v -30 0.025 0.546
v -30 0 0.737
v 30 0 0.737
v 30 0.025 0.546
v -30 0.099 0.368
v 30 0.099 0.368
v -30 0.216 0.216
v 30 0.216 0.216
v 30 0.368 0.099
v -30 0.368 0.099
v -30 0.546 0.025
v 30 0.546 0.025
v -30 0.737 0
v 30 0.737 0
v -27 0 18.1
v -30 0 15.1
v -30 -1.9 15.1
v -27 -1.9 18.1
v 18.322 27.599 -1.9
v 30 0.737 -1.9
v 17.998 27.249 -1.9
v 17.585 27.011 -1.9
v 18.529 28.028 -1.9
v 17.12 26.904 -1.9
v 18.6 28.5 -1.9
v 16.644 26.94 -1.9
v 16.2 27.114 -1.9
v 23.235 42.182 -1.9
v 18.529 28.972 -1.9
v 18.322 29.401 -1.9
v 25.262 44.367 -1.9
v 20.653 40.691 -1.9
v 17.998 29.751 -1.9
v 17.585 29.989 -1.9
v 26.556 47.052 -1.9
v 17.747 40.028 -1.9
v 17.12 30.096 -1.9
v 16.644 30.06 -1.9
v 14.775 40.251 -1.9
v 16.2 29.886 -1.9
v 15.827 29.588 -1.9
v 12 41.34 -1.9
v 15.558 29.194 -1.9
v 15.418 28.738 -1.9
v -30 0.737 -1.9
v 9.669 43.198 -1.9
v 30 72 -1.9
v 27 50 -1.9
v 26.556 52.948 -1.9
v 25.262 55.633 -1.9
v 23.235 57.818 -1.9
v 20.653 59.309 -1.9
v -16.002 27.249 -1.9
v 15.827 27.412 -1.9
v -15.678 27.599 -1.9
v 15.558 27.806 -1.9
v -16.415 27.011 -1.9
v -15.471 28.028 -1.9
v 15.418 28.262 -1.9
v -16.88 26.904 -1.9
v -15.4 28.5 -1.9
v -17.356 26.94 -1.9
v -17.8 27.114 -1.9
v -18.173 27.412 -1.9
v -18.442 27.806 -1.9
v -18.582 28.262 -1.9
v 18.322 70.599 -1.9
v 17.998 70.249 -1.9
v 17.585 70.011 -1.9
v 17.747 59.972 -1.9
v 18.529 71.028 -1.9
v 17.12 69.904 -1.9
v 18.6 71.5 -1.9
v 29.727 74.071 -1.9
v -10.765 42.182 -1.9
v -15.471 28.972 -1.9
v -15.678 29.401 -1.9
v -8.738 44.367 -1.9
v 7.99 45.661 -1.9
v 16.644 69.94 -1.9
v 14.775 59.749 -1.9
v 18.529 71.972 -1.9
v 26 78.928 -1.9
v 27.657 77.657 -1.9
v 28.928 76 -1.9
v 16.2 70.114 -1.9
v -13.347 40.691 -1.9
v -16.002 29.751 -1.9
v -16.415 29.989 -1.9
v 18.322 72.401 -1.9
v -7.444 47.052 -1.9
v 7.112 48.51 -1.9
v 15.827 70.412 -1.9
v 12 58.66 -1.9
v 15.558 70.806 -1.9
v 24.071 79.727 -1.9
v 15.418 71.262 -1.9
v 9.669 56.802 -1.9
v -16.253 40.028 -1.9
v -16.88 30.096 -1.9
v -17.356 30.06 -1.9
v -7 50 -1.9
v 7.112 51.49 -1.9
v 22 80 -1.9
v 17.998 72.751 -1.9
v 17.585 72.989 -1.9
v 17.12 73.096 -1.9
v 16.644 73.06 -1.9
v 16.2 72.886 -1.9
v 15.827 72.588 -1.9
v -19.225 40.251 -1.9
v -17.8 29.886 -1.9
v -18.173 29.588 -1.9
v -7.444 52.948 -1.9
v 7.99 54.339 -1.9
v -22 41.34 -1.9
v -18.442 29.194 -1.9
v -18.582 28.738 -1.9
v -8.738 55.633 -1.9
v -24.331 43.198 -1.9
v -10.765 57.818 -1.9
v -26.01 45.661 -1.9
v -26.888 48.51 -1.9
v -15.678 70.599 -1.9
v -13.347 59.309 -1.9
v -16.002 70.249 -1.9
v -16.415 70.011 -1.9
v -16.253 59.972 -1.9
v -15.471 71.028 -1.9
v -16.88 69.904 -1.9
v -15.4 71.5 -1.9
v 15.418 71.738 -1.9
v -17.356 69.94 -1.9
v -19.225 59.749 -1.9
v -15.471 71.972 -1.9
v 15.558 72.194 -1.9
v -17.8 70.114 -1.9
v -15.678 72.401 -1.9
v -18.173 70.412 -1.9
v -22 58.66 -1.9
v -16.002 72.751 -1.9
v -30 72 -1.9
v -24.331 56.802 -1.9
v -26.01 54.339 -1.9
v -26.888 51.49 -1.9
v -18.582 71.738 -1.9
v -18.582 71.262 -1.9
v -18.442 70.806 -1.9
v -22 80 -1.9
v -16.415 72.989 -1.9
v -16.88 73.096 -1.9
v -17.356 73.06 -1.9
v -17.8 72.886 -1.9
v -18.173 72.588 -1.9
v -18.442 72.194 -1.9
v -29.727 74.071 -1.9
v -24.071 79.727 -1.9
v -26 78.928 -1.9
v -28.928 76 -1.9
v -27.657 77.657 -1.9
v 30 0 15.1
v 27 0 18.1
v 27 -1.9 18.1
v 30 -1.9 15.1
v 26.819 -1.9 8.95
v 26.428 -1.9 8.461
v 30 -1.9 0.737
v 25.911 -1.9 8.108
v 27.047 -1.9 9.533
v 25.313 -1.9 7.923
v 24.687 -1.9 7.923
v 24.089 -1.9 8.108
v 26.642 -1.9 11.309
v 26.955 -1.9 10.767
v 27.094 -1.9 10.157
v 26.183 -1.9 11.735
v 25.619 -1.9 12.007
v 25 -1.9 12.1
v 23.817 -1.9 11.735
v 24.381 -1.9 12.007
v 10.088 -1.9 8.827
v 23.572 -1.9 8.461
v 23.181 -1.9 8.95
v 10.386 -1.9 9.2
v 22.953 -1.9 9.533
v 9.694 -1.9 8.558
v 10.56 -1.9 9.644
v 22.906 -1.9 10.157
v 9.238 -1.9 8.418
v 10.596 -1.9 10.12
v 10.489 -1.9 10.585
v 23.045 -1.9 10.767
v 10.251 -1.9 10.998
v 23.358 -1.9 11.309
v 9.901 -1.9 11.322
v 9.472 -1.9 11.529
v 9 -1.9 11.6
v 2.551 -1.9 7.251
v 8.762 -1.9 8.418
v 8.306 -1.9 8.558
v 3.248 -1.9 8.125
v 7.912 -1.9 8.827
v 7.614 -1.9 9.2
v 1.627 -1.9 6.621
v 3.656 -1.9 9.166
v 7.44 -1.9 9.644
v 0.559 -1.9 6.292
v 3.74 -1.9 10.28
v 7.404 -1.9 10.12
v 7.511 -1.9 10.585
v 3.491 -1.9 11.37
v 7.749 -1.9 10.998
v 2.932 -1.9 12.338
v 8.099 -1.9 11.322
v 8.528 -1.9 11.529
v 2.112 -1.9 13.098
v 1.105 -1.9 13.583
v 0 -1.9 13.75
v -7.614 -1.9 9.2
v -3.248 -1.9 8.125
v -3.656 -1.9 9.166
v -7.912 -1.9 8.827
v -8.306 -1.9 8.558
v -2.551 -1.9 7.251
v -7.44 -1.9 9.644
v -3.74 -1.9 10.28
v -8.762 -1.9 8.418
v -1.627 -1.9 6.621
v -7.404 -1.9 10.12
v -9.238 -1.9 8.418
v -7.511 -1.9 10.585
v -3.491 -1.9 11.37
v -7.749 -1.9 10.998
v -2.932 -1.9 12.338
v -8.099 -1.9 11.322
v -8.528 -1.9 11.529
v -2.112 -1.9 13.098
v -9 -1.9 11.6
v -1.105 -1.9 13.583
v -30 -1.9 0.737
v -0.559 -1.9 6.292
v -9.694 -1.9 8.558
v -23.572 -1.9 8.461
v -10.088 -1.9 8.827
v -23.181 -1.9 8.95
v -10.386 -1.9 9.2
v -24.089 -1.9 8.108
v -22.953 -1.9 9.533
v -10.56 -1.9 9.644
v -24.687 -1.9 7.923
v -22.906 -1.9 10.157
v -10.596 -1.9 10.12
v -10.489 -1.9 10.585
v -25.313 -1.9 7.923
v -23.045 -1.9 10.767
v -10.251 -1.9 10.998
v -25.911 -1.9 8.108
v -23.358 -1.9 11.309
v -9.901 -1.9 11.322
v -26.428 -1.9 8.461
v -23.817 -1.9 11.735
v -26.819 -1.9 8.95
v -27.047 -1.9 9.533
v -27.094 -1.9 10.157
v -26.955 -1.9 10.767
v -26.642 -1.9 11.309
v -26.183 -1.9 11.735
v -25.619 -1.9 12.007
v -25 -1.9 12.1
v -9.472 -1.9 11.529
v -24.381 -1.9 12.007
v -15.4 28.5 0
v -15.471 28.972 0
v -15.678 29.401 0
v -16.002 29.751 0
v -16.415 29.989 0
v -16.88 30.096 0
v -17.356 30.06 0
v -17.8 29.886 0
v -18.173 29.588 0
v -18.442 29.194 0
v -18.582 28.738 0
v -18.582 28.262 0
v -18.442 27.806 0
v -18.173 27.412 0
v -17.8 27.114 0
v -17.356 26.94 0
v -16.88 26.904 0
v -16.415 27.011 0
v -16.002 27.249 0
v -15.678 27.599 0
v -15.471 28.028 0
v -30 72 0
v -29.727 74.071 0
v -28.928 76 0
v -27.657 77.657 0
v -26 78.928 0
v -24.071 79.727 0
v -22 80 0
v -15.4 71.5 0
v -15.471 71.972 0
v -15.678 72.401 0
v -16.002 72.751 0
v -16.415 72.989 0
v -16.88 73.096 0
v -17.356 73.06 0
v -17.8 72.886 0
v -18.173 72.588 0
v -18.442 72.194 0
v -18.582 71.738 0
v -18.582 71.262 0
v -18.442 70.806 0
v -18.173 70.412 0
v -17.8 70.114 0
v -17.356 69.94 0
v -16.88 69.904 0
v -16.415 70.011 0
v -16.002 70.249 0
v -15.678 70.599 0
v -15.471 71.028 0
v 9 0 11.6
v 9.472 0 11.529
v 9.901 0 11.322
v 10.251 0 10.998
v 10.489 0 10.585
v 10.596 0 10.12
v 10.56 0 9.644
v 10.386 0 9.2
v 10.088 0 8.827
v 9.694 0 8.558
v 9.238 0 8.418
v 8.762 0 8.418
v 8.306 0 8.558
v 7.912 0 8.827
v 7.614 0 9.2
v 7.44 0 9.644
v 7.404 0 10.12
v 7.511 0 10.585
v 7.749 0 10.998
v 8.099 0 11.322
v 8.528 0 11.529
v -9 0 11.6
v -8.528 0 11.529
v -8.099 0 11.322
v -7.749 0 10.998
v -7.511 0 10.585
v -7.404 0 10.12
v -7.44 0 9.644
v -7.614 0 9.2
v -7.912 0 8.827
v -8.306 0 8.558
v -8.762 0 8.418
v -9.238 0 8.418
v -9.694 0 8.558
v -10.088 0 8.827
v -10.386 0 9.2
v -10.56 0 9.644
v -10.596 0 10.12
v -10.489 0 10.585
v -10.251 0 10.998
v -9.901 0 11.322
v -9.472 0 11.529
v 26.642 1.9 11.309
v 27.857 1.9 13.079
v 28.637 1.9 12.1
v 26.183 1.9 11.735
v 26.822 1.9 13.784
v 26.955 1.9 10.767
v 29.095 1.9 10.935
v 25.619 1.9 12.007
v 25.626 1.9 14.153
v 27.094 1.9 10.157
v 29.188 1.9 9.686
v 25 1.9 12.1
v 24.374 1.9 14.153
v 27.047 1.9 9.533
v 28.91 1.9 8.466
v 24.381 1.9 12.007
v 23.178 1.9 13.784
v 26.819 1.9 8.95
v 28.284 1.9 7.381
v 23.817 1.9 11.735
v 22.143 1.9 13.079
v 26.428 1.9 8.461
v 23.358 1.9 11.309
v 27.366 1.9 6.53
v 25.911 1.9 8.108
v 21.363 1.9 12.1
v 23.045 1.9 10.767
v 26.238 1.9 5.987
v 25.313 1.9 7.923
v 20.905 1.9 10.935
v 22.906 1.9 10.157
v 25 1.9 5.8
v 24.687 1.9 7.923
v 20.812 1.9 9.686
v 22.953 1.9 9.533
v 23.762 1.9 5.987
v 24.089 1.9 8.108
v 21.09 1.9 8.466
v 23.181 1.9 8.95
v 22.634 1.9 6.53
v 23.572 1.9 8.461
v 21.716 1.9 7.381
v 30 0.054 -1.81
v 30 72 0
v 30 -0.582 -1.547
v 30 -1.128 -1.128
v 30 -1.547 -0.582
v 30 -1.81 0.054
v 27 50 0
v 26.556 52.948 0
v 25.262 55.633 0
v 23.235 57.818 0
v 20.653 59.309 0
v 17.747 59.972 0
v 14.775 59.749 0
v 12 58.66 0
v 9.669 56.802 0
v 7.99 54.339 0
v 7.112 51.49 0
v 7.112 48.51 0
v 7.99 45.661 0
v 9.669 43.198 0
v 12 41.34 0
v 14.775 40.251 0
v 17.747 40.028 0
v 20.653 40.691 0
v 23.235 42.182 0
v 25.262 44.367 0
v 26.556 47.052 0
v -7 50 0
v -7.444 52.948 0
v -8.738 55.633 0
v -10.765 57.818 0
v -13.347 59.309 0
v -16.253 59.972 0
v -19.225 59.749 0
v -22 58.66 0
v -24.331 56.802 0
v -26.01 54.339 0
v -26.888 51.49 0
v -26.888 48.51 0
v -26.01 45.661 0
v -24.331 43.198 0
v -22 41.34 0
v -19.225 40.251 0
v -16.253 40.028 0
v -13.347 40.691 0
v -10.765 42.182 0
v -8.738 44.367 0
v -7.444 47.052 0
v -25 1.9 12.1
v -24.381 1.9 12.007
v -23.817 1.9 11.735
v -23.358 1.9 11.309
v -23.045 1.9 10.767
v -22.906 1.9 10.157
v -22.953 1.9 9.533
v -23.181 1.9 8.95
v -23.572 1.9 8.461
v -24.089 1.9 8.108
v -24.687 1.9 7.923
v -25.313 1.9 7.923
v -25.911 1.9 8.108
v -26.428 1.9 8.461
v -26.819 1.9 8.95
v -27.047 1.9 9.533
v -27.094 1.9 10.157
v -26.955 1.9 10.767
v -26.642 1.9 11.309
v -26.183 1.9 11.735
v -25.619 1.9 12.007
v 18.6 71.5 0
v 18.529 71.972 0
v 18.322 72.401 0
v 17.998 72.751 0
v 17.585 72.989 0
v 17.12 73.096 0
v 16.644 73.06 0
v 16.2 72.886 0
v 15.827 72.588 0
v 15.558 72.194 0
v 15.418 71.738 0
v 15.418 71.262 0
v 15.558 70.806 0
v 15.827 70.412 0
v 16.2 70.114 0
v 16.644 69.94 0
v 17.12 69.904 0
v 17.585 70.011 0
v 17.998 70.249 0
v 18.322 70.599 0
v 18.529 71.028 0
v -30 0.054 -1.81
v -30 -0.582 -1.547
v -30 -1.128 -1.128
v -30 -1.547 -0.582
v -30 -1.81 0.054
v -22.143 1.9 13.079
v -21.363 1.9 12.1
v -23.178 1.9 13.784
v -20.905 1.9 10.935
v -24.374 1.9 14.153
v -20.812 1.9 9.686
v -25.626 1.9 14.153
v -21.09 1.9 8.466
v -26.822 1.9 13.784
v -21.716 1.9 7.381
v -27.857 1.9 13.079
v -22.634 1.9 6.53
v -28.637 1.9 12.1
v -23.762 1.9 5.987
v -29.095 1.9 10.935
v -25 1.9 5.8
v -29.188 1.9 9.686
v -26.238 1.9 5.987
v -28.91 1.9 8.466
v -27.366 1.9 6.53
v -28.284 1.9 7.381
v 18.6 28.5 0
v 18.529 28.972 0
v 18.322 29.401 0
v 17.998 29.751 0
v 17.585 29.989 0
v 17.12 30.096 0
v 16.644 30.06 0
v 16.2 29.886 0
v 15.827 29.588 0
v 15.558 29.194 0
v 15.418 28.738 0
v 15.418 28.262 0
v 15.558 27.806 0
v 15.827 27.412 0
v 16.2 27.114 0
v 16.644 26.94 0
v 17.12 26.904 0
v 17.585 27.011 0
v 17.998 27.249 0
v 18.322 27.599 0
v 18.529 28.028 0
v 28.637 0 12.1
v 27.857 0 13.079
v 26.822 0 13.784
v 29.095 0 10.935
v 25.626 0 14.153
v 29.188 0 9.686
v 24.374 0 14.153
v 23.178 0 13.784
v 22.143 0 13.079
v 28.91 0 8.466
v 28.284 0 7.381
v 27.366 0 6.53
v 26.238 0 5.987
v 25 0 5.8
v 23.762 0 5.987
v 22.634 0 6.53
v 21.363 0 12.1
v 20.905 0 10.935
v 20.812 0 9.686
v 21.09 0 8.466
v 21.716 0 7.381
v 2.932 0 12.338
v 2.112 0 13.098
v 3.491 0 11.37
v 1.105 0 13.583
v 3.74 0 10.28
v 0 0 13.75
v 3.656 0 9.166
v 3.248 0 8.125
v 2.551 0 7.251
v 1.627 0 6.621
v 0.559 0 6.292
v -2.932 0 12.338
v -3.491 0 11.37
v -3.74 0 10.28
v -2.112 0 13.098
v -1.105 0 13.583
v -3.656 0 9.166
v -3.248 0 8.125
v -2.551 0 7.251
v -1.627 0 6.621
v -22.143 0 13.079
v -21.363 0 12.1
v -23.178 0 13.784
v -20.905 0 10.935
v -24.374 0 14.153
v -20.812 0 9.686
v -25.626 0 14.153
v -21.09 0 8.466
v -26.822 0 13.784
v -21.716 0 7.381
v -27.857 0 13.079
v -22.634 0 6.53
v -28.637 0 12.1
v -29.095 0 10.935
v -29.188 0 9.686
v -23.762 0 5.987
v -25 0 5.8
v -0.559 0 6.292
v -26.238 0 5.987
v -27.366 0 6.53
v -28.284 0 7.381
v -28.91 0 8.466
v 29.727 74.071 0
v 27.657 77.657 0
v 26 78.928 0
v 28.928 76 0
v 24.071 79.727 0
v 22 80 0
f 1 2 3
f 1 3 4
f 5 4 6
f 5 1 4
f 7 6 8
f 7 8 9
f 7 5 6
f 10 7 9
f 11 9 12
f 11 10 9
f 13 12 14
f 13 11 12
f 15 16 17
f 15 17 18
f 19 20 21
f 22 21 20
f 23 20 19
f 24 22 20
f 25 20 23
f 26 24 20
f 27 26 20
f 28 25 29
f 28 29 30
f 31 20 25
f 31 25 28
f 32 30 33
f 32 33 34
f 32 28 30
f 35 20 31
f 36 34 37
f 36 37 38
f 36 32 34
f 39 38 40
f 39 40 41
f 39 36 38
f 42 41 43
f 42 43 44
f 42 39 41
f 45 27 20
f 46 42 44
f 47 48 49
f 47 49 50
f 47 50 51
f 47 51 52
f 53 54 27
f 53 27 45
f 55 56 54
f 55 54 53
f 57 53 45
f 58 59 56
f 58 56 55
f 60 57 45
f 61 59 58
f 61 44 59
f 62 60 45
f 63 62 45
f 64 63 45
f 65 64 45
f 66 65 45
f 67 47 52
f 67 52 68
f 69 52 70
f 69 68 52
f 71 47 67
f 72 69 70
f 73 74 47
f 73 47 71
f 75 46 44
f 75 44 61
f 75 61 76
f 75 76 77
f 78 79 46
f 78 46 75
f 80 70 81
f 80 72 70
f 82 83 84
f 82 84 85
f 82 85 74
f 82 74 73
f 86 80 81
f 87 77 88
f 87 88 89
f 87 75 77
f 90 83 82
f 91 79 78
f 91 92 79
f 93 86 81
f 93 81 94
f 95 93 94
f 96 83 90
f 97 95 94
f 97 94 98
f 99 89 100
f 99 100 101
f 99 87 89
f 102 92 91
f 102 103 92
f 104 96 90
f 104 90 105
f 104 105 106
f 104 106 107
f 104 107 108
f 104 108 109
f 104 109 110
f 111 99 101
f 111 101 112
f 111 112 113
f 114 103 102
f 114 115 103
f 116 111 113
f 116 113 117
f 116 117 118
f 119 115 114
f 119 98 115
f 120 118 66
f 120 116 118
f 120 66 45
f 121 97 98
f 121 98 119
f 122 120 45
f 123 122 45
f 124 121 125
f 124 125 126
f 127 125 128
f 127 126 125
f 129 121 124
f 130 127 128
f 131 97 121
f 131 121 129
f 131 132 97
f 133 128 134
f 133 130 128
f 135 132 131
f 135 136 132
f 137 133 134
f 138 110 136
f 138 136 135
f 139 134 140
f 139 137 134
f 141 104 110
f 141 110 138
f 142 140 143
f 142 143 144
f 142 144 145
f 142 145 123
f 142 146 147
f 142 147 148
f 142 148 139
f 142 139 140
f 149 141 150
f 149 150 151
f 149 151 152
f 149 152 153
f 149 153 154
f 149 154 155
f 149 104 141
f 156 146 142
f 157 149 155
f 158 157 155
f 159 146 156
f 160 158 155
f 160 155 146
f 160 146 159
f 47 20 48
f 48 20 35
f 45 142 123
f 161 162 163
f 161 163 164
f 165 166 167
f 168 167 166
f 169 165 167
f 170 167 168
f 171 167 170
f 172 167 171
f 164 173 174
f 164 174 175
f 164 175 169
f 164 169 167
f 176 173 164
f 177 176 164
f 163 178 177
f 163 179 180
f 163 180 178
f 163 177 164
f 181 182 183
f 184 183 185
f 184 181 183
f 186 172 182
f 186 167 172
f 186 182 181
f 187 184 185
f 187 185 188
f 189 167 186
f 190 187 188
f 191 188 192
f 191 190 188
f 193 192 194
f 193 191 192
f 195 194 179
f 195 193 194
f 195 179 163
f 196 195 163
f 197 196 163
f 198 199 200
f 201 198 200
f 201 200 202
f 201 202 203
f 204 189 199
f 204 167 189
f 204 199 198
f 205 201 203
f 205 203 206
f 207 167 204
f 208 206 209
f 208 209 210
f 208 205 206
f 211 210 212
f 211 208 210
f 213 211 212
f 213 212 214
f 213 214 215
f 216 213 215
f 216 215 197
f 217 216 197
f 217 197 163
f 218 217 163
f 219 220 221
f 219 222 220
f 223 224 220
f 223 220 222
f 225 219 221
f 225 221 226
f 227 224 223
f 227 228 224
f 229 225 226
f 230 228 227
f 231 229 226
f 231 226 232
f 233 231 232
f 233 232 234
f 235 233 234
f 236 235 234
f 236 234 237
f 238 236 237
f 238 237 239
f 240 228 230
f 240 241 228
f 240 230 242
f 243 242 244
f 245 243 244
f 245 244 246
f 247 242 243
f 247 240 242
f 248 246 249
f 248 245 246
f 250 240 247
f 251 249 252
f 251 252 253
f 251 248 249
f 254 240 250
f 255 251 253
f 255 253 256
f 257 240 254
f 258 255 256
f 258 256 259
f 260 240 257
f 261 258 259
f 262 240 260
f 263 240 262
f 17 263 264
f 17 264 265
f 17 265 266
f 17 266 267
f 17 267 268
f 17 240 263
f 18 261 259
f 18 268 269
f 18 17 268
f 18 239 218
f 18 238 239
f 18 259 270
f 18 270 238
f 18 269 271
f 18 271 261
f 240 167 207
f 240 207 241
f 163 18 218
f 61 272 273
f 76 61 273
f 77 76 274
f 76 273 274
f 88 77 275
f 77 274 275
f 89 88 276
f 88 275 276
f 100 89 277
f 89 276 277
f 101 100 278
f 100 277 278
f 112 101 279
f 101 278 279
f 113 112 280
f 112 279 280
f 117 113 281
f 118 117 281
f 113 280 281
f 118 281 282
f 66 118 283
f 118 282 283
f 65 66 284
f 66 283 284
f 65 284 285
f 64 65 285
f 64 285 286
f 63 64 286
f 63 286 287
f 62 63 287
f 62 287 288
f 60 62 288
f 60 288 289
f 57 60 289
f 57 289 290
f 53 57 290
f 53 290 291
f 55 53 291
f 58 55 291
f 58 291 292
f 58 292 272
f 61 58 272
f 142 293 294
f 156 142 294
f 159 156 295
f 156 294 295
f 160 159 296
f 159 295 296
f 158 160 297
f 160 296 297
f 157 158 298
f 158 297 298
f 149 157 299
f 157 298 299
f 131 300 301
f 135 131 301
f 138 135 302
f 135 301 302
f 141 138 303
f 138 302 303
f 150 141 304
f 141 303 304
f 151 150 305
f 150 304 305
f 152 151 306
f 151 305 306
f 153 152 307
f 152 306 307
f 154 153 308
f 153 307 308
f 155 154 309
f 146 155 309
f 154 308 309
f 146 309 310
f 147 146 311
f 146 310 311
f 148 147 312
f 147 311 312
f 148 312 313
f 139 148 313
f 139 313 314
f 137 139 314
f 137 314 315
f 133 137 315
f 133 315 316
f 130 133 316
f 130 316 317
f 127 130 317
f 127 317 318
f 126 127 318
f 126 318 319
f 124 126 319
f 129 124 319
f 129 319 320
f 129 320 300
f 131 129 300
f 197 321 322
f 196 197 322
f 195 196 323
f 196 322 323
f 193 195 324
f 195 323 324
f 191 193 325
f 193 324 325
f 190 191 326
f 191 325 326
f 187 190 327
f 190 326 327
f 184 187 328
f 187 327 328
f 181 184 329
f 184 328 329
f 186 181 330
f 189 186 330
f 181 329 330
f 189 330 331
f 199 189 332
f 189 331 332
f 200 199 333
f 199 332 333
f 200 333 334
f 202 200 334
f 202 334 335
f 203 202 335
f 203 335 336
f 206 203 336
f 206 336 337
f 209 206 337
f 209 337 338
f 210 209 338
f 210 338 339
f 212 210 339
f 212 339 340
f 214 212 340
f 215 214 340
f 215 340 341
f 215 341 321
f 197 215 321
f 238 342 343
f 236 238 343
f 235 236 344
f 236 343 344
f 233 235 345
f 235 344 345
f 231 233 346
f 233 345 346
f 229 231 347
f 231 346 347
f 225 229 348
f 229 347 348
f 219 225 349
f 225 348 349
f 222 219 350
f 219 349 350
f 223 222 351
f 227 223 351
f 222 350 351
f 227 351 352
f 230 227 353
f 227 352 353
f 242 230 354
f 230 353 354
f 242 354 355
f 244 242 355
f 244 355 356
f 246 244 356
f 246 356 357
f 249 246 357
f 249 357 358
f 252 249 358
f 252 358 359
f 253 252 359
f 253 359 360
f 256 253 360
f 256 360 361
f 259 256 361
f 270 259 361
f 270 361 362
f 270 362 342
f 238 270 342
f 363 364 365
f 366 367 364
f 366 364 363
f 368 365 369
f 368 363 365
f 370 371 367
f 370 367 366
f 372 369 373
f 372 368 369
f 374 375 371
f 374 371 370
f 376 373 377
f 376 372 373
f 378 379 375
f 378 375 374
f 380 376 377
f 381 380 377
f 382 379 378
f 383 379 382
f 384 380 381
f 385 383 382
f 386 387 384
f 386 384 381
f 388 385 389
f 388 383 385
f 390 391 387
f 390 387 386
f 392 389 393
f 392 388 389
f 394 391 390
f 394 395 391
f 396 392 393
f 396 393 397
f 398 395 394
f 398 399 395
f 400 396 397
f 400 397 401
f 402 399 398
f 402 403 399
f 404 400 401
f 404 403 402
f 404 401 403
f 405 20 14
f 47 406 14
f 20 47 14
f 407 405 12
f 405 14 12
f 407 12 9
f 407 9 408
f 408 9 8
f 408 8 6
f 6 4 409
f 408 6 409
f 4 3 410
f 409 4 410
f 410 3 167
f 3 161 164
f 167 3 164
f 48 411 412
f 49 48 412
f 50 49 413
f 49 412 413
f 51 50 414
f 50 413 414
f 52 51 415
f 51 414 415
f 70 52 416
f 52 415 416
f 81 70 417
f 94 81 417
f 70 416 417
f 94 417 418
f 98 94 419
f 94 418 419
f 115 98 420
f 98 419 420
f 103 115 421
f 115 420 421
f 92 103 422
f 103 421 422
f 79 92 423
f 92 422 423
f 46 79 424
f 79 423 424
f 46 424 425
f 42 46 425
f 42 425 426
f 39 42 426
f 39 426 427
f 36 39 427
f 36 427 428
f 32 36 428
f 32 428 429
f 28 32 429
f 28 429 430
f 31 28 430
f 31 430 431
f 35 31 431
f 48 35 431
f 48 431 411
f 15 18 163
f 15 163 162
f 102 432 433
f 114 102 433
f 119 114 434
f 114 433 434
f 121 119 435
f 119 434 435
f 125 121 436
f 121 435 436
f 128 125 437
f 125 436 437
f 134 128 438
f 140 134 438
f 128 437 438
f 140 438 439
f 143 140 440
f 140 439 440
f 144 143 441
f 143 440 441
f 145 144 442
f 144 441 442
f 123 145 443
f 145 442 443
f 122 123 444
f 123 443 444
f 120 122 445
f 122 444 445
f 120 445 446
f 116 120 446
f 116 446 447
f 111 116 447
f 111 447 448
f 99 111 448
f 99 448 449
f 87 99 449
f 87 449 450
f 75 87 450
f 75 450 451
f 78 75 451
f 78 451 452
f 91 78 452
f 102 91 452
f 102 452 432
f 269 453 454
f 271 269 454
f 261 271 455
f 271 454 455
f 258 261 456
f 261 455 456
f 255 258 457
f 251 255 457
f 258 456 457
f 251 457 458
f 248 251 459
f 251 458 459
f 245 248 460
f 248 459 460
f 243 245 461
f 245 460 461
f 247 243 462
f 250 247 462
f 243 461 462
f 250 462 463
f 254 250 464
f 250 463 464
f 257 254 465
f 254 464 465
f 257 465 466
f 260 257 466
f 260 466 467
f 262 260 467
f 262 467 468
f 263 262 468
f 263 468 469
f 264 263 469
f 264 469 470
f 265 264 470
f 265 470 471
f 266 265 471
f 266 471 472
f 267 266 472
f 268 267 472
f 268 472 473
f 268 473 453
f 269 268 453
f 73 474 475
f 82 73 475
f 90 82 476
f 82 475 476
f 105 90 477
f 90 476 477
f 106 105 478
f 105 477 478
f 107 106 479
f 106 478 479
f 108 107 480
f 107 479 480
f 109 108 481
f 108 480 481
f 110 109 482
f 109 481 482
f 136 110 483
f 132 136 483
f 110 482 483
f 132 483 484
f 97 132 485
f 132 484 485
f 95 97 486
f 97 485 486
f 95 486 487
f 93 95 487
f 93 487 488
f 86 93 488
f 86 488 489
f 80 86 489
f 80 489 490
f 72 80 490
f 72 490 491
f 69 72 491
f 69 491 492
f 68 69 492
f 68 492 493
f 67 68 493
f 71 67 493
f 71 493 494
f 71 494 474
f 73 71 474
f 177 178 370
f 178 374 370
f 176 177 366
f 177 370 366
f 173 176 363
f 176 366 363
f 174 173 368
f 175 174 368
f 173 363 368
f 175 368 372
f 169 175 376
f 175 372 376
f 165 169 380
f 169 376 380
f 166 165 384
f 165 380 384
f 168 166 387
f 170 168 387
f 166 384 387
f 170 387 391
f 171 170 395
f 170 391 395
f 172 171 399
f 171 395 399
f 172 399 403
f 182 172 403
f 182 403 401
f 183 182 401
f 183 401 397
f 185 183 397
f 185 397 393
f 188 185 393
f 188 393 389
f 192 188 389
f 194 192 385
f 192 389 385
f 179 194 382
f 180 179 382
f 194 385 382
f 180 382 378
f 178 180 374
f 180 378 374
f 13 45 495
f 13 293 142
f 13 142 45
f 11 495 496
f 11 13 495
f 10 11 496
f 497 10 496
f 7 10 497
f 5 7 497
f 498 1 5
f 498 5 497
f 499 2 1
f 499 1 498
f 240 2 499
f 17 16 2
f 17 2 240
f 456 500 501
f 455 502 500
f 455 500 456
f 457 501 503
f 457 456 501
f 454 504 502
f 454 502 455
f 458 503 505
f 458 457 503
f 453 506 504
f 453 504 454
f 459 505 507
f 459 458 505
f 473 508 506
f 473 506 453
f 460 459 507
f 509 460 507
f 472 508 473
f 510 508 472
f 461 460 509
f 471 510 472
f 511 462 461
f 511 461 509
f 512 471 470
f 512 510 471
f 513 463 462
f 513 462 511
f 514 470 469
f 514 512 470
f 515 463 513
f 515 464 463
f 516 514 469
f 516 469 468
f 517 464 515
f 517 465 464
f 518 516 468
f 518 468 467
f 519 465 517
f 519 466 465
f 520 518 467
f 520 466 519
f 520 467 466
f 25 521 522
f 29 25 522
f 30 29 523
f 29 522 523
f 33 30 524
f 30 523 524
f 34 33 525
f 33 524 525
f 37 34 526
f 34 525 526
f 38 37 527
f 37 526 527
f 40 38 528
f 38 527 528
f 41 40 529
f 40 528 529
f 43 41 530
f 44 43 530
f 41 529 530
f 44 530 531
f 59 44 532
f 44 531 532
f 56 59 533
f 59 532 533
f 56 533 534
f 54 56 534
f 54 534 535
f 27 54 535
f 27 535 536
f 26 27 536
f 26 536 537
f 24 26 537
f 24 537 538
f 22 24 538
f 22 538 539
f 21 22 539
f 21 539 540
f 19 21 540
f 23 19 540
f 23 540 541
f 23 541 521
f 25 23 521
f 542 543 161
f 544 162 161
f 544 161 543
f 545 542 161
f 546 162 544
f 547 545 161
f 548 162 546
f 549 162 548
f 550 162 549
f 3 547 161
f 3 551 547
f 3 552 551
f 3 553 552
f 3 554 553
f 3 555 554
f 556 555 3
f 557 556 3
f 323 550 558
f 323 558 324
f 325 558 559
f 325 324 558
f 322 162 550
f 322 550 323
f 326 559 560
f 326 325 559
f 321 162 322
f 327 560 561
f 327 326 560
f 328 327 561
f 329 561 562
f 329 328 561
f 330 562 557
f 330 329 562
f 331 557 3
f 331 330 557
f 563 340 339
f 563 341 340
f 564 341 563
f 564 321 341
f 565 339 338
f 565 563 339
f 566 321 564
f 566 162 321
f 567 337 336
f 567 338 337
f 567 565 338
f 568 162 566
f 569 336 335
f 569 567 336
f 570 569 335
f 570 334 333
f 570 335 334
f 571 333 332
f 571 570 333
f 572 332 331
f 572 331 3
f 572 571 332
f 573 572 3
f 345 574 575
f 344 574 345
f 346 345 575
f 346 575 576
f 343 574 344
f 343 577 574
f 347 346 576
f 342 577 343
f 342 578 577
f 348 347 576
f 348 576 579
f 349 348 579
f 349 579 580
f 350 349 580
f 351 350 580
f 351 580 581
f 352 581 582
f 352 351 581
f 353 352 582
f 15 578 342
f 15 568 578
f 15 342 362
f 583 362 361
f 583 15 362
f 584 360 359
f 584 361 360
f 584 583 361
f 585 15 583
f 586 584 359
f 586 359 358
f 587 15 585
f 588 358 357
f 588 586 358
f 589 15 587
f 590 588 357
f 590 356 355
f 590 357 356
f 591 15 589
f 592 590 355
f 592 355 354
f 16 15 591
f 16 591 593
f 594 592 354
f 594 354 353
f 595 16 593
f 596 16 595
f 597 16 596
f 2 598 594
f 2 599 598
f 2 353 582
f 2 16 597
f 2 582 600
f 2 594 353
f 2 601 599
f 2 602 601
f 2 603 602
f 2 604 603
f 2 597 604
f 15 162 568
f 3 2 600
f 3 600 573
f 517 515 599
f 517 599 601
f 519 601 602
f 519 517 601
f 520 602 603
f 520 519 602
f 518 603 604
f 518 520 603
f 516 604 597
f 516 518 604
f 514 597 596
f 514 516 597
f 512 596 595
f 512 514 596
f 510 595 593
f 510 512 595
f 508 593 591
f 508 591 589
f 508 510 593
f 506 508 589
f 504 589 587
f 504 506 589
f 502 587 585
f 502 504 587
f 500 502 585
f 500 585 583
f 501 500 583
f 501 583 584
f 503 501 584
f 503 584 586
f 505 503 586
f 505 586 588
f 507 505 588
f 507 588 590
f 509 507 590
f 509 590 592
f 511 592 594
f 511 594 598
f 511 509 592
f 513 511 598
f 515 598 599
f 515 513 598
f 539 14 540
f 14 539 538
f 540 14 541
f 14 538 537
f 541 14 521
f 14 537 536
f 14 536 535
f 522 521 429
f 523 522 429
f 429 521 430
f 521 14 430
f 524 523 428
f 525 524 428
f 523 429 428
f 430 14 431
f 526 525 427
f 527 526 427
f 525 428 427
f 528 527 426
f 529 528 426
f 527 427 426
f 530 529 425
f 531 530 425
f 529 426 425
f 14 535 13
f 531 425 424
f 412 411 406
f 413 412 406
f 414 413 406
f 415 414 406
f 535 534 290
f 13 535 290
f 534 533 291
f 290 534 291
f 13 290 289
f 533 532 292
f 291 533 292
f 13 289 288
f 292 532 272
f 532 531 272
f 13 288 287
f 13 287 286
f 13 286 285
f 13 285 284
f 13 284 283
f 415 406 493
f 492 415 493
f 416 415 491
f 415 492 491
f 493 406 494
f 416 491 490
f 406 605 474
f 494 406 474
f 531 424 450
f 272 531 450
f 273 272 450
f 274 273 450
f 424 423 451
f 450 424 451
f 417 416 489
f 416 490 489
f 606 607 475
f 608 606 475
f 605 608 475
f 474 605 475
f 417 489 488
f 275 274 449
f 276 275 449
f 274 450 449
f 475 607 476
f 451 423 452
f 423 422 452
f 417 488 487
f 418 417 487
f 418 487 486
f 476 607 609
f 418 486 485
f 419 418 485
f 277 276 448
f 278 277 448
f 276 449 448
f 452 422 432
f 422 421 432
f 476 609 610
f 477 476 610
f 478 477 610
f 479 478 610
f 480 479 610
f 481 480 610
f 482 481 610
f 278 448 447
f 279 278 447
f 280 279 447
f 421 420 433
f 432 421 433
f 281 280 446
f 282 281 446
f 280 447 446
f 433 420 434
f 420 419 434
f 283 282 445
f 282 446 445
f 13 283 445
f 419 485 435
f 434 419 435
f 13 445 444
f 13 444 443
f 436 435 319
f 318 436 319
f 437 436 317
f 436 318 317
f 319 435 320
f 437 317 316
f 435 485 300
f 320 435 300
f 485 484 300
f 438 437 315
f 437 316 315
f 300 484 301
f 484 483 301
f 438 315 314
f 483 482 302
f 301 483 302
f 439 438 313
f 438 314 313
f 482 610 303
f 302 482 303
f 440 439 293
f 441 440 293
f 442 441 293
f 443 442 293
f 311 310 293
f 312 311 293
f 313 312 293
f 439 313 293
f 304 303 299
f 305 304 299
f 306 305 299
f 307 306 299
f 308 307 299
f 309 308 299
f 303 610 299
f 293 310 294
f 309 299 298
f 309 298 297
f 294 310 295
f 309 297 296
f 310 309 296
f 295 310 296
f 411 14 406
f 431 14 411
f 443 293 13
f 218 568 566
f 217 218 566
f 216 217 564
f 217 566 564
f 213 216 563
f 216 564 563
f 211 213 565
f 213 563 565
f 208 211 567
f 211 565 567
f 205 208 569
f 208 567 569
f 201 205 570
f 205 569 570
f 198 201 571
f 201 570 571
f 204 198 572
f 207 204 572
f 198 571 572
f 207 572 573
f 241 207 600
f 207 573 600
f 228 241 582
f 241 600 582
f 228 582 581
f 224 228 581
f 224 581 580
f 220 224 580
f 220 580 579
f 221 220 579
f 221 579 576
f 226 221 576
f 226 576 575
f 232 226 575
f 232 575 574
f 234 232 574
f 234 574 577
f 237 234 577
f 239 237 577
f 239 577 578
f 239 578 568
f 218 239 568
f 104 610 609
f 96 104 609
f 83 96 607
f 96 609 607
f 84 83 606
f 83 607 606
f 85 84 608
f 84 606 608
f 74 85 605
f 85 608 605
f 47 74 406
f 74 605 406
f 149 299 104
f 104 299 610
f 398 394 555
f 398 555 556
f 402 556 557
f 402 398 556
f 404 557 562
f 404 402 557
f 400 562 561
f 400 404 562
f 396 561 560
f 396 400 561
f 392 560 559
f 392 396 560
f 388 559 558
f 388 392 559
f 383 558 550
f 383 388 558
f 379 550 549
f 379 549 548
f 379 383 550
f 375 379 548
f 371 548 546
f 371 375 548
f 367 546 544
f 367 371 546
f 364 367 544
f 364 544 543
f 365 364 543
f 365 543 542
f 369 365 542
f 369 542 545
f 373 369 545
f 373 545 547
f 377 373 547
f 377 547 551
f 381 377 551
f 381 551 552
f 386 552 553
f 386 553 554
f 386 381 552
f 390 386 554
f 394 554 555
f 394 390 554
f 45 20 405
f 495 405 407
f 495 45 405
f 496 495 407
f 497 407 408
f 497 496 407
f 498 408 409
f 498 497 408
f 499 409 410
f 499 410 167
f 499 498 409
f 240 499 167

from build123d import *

# Parameters (mm, degrees)
SM_BASE_FLANGE_1_DEPTH           = 1.9
SM_EDGE_FLANGE_1_STRIP_W         = 9.0732
SM_EDGE_FLANGE_1_STRIP_H         = 1.9
SM_EDGE_FLANGE_1_STRIP_CUT_DEPTH = 60
SM_EDGE_FLANGE_1_DEPTH           = 60
CUT_EXTRUDE_1_DEPTH              = 88.336189521
SKETCH_9_R                       = 2.1
SKETCH_9_R_2                     = 1.6
SKETCH_9_R_3                     = 3.75
CUT_EXTRUDE_2_DEPTH              = 88.336189521
EXTRUDE_START                    = 1.9
SKETCH_10_R                      = 4.2
SKETCH_10_R_2                    = 2.1
EXTRUDE_2_DEPTH                  = 1.9
SKETCH_11_R                      = 1.6
SKETCH_11_R_2                    = 10
CUT_EXTRUDE_3_DEPTH              = 88.336189521


# Sheet-metal steps are written as plain solids
with BuildPart() as part:
    # Sketch 1 → 基体-法兰1 (new body)
    with BuildSketch(Plane.XY):
        with BuildLine():
            Line((-22, 80), (22, 80))
            ThreePointArc((22, 80), (27.656854249, 77.656854249), (30, 72))
            Line((30, 72), (30, 0))
            Line((30, 0), (-30, 0))
            Line((-30, 0), (-30, 72))
            ThreePointArc((-30, 72), (-27.656854249, 77.656854249), (-22, 80))
        make_face()
    extrude(amount=-SM_BASE_FLANGE_1_DEPTH)

    # 边线-法兰1 strip (across the edge) → 边线-法兰1 strip cut (cut)
    with BuildSketch(Plane.YZ.offset(-30)):
        with Locations((-3.8, -0.95)):
            Rectangle(SM_EDGE_FLANGE_1_STRIP_W, SM_EDGE_FLANGE_1_STRIP_H)
    extrude(amount=SM_EDGE_FLANGE_1_STRIP_CUT_DEPTH, mode=Mode.SUBTRACT)

    # 边线-法兰1 section (across the edge) → 边线-法兰1 (add)
    with BuildSketch(Plane.YZ.offset(-30)):
        with BuildLine():
            Line((-1.9, 0.7366), (-1.9, 18.1))
            Line((-1.9, 18.1), (0, 18.1))
            Line((0, 18.1), (0, 0.7366))
            ThreePointArc((0, 0.7366), (0.215745145, 0.215745145), (0.7366, 0))
            Line((0.7366, 0), (0.7366, -1.9))
            ThreePointArc((0.7366, -1.9), (-1.127757739, -1.127757739), (-1.9, 0.7366))
        make_face()
    extrude(amount=SM_EDGE_FLANGE_1_DEPTH)

    # 草图8 → 切除-拉伸1 (cut, through all)
    with BuildSketch(Plane(origin=(0, 0, 0), x_dir=(1, 0, 0), z_dir=(0, 1, 0))):
        Polygon((-30, -15.1), (-27, -18.1), (-30, -18.1), align=None)
        Polygon((27, -18.1), (30, -15.1), (30, -18.1), align=None)
    extrude(amount=-CUT_EXTRUDE_1_DEPTH, mode=Mode.SUBTRACT)

    # 草图9 → 切除-拉伸2 (cut, through all)
    with BuildSketch(Plane(origin=(0, 0, 0), x_dir=(1, 0, 0), z_dir=(0, 1, 0))):
        with Locations(Location((-25, -10, 0), (0, 0, 270))):
            Circle(SKETCH_9_R)
        with Locations(Location((-9, -10, 0), (0, 0, 270))):
            Circle(SKETCH_9_R_2)
        with Locations(Location((0, -10, 0), (0, 0, 270))):
            Circle(SKETCH_9_R_3)
        with Locations(Location((9, -10, 0), (0, 0, 270))):
            Circle(SKETCH_9_R_2)
        with Locations(Location((25, -10, 0), (0, 0, 270))):
            Circle(SKETCH_9_R)
    extrude(amount=-CUT_EXTRUDE_2_DEPTH, mode=Mode.SUBTRACT)

    # 草图10 → 凸台-拉伸2 (add)
    # profile 1 of 2: a face of its own
    with BuildSketch(Plane(origin=(0, 0, 0), x_dir=(1, 0, 0), z_dir=(0, 1, 0)).offset(EXTRUDE_START)):
        with Locations(Location((-25, -10, 0), (0, 0, 90))):
            Circle(SKETCH_10_R)
        with Locations(Location((-25, -10, 0), (0, 0, 270))):
            Circle(SKETCH_10_R_2, mode=Mode.SUBTRACT)
    # profile 2 of 2: a face of its own
    with BuildSketch(Plane(origin=(0, 0, 0), x_dir=(1, 0, 0), z_dir=(0, 1, 0)).offset(EXTRUDE_START)):
        with Locations(Location((25, -10, 0), (0, 0, 90))):
            Circle(SKETCH_10_R)
        with Locations(Location((25, -10, 0), (0, 0, 270))):
            Circle(SKETCH_10_R_2, mode=Mode.SUBTRACT)
    extrude(amount=-EXTRUDE_2_DEPTH)

    # 草图11 → 切除-拉伸3 (cut, through all)
    with BuildSketch(Plane.XY):
        with Locations((-17, 71.5)):
            Circle(SKETCH_11_R)
        with Locations((-17, 50)):
            Circle(SKETCH_11_R_2)
        with Locations((-17, 28.5)):
            Circle(SKETCH_11_R)
        with Locations((17, 28.5)):
            Circle(SKETCH_11_R)
        with Locations((17, 50)):
            Circle(SKETCH_11_R_2)
        with Locations((17, 71.5)):
            Circle(SKETCH_11_R)
    extrude(amount=-CUT_EXTRUDE_3_DEPTH, mode=Mode.SUBTRACT)


solid = part.part
